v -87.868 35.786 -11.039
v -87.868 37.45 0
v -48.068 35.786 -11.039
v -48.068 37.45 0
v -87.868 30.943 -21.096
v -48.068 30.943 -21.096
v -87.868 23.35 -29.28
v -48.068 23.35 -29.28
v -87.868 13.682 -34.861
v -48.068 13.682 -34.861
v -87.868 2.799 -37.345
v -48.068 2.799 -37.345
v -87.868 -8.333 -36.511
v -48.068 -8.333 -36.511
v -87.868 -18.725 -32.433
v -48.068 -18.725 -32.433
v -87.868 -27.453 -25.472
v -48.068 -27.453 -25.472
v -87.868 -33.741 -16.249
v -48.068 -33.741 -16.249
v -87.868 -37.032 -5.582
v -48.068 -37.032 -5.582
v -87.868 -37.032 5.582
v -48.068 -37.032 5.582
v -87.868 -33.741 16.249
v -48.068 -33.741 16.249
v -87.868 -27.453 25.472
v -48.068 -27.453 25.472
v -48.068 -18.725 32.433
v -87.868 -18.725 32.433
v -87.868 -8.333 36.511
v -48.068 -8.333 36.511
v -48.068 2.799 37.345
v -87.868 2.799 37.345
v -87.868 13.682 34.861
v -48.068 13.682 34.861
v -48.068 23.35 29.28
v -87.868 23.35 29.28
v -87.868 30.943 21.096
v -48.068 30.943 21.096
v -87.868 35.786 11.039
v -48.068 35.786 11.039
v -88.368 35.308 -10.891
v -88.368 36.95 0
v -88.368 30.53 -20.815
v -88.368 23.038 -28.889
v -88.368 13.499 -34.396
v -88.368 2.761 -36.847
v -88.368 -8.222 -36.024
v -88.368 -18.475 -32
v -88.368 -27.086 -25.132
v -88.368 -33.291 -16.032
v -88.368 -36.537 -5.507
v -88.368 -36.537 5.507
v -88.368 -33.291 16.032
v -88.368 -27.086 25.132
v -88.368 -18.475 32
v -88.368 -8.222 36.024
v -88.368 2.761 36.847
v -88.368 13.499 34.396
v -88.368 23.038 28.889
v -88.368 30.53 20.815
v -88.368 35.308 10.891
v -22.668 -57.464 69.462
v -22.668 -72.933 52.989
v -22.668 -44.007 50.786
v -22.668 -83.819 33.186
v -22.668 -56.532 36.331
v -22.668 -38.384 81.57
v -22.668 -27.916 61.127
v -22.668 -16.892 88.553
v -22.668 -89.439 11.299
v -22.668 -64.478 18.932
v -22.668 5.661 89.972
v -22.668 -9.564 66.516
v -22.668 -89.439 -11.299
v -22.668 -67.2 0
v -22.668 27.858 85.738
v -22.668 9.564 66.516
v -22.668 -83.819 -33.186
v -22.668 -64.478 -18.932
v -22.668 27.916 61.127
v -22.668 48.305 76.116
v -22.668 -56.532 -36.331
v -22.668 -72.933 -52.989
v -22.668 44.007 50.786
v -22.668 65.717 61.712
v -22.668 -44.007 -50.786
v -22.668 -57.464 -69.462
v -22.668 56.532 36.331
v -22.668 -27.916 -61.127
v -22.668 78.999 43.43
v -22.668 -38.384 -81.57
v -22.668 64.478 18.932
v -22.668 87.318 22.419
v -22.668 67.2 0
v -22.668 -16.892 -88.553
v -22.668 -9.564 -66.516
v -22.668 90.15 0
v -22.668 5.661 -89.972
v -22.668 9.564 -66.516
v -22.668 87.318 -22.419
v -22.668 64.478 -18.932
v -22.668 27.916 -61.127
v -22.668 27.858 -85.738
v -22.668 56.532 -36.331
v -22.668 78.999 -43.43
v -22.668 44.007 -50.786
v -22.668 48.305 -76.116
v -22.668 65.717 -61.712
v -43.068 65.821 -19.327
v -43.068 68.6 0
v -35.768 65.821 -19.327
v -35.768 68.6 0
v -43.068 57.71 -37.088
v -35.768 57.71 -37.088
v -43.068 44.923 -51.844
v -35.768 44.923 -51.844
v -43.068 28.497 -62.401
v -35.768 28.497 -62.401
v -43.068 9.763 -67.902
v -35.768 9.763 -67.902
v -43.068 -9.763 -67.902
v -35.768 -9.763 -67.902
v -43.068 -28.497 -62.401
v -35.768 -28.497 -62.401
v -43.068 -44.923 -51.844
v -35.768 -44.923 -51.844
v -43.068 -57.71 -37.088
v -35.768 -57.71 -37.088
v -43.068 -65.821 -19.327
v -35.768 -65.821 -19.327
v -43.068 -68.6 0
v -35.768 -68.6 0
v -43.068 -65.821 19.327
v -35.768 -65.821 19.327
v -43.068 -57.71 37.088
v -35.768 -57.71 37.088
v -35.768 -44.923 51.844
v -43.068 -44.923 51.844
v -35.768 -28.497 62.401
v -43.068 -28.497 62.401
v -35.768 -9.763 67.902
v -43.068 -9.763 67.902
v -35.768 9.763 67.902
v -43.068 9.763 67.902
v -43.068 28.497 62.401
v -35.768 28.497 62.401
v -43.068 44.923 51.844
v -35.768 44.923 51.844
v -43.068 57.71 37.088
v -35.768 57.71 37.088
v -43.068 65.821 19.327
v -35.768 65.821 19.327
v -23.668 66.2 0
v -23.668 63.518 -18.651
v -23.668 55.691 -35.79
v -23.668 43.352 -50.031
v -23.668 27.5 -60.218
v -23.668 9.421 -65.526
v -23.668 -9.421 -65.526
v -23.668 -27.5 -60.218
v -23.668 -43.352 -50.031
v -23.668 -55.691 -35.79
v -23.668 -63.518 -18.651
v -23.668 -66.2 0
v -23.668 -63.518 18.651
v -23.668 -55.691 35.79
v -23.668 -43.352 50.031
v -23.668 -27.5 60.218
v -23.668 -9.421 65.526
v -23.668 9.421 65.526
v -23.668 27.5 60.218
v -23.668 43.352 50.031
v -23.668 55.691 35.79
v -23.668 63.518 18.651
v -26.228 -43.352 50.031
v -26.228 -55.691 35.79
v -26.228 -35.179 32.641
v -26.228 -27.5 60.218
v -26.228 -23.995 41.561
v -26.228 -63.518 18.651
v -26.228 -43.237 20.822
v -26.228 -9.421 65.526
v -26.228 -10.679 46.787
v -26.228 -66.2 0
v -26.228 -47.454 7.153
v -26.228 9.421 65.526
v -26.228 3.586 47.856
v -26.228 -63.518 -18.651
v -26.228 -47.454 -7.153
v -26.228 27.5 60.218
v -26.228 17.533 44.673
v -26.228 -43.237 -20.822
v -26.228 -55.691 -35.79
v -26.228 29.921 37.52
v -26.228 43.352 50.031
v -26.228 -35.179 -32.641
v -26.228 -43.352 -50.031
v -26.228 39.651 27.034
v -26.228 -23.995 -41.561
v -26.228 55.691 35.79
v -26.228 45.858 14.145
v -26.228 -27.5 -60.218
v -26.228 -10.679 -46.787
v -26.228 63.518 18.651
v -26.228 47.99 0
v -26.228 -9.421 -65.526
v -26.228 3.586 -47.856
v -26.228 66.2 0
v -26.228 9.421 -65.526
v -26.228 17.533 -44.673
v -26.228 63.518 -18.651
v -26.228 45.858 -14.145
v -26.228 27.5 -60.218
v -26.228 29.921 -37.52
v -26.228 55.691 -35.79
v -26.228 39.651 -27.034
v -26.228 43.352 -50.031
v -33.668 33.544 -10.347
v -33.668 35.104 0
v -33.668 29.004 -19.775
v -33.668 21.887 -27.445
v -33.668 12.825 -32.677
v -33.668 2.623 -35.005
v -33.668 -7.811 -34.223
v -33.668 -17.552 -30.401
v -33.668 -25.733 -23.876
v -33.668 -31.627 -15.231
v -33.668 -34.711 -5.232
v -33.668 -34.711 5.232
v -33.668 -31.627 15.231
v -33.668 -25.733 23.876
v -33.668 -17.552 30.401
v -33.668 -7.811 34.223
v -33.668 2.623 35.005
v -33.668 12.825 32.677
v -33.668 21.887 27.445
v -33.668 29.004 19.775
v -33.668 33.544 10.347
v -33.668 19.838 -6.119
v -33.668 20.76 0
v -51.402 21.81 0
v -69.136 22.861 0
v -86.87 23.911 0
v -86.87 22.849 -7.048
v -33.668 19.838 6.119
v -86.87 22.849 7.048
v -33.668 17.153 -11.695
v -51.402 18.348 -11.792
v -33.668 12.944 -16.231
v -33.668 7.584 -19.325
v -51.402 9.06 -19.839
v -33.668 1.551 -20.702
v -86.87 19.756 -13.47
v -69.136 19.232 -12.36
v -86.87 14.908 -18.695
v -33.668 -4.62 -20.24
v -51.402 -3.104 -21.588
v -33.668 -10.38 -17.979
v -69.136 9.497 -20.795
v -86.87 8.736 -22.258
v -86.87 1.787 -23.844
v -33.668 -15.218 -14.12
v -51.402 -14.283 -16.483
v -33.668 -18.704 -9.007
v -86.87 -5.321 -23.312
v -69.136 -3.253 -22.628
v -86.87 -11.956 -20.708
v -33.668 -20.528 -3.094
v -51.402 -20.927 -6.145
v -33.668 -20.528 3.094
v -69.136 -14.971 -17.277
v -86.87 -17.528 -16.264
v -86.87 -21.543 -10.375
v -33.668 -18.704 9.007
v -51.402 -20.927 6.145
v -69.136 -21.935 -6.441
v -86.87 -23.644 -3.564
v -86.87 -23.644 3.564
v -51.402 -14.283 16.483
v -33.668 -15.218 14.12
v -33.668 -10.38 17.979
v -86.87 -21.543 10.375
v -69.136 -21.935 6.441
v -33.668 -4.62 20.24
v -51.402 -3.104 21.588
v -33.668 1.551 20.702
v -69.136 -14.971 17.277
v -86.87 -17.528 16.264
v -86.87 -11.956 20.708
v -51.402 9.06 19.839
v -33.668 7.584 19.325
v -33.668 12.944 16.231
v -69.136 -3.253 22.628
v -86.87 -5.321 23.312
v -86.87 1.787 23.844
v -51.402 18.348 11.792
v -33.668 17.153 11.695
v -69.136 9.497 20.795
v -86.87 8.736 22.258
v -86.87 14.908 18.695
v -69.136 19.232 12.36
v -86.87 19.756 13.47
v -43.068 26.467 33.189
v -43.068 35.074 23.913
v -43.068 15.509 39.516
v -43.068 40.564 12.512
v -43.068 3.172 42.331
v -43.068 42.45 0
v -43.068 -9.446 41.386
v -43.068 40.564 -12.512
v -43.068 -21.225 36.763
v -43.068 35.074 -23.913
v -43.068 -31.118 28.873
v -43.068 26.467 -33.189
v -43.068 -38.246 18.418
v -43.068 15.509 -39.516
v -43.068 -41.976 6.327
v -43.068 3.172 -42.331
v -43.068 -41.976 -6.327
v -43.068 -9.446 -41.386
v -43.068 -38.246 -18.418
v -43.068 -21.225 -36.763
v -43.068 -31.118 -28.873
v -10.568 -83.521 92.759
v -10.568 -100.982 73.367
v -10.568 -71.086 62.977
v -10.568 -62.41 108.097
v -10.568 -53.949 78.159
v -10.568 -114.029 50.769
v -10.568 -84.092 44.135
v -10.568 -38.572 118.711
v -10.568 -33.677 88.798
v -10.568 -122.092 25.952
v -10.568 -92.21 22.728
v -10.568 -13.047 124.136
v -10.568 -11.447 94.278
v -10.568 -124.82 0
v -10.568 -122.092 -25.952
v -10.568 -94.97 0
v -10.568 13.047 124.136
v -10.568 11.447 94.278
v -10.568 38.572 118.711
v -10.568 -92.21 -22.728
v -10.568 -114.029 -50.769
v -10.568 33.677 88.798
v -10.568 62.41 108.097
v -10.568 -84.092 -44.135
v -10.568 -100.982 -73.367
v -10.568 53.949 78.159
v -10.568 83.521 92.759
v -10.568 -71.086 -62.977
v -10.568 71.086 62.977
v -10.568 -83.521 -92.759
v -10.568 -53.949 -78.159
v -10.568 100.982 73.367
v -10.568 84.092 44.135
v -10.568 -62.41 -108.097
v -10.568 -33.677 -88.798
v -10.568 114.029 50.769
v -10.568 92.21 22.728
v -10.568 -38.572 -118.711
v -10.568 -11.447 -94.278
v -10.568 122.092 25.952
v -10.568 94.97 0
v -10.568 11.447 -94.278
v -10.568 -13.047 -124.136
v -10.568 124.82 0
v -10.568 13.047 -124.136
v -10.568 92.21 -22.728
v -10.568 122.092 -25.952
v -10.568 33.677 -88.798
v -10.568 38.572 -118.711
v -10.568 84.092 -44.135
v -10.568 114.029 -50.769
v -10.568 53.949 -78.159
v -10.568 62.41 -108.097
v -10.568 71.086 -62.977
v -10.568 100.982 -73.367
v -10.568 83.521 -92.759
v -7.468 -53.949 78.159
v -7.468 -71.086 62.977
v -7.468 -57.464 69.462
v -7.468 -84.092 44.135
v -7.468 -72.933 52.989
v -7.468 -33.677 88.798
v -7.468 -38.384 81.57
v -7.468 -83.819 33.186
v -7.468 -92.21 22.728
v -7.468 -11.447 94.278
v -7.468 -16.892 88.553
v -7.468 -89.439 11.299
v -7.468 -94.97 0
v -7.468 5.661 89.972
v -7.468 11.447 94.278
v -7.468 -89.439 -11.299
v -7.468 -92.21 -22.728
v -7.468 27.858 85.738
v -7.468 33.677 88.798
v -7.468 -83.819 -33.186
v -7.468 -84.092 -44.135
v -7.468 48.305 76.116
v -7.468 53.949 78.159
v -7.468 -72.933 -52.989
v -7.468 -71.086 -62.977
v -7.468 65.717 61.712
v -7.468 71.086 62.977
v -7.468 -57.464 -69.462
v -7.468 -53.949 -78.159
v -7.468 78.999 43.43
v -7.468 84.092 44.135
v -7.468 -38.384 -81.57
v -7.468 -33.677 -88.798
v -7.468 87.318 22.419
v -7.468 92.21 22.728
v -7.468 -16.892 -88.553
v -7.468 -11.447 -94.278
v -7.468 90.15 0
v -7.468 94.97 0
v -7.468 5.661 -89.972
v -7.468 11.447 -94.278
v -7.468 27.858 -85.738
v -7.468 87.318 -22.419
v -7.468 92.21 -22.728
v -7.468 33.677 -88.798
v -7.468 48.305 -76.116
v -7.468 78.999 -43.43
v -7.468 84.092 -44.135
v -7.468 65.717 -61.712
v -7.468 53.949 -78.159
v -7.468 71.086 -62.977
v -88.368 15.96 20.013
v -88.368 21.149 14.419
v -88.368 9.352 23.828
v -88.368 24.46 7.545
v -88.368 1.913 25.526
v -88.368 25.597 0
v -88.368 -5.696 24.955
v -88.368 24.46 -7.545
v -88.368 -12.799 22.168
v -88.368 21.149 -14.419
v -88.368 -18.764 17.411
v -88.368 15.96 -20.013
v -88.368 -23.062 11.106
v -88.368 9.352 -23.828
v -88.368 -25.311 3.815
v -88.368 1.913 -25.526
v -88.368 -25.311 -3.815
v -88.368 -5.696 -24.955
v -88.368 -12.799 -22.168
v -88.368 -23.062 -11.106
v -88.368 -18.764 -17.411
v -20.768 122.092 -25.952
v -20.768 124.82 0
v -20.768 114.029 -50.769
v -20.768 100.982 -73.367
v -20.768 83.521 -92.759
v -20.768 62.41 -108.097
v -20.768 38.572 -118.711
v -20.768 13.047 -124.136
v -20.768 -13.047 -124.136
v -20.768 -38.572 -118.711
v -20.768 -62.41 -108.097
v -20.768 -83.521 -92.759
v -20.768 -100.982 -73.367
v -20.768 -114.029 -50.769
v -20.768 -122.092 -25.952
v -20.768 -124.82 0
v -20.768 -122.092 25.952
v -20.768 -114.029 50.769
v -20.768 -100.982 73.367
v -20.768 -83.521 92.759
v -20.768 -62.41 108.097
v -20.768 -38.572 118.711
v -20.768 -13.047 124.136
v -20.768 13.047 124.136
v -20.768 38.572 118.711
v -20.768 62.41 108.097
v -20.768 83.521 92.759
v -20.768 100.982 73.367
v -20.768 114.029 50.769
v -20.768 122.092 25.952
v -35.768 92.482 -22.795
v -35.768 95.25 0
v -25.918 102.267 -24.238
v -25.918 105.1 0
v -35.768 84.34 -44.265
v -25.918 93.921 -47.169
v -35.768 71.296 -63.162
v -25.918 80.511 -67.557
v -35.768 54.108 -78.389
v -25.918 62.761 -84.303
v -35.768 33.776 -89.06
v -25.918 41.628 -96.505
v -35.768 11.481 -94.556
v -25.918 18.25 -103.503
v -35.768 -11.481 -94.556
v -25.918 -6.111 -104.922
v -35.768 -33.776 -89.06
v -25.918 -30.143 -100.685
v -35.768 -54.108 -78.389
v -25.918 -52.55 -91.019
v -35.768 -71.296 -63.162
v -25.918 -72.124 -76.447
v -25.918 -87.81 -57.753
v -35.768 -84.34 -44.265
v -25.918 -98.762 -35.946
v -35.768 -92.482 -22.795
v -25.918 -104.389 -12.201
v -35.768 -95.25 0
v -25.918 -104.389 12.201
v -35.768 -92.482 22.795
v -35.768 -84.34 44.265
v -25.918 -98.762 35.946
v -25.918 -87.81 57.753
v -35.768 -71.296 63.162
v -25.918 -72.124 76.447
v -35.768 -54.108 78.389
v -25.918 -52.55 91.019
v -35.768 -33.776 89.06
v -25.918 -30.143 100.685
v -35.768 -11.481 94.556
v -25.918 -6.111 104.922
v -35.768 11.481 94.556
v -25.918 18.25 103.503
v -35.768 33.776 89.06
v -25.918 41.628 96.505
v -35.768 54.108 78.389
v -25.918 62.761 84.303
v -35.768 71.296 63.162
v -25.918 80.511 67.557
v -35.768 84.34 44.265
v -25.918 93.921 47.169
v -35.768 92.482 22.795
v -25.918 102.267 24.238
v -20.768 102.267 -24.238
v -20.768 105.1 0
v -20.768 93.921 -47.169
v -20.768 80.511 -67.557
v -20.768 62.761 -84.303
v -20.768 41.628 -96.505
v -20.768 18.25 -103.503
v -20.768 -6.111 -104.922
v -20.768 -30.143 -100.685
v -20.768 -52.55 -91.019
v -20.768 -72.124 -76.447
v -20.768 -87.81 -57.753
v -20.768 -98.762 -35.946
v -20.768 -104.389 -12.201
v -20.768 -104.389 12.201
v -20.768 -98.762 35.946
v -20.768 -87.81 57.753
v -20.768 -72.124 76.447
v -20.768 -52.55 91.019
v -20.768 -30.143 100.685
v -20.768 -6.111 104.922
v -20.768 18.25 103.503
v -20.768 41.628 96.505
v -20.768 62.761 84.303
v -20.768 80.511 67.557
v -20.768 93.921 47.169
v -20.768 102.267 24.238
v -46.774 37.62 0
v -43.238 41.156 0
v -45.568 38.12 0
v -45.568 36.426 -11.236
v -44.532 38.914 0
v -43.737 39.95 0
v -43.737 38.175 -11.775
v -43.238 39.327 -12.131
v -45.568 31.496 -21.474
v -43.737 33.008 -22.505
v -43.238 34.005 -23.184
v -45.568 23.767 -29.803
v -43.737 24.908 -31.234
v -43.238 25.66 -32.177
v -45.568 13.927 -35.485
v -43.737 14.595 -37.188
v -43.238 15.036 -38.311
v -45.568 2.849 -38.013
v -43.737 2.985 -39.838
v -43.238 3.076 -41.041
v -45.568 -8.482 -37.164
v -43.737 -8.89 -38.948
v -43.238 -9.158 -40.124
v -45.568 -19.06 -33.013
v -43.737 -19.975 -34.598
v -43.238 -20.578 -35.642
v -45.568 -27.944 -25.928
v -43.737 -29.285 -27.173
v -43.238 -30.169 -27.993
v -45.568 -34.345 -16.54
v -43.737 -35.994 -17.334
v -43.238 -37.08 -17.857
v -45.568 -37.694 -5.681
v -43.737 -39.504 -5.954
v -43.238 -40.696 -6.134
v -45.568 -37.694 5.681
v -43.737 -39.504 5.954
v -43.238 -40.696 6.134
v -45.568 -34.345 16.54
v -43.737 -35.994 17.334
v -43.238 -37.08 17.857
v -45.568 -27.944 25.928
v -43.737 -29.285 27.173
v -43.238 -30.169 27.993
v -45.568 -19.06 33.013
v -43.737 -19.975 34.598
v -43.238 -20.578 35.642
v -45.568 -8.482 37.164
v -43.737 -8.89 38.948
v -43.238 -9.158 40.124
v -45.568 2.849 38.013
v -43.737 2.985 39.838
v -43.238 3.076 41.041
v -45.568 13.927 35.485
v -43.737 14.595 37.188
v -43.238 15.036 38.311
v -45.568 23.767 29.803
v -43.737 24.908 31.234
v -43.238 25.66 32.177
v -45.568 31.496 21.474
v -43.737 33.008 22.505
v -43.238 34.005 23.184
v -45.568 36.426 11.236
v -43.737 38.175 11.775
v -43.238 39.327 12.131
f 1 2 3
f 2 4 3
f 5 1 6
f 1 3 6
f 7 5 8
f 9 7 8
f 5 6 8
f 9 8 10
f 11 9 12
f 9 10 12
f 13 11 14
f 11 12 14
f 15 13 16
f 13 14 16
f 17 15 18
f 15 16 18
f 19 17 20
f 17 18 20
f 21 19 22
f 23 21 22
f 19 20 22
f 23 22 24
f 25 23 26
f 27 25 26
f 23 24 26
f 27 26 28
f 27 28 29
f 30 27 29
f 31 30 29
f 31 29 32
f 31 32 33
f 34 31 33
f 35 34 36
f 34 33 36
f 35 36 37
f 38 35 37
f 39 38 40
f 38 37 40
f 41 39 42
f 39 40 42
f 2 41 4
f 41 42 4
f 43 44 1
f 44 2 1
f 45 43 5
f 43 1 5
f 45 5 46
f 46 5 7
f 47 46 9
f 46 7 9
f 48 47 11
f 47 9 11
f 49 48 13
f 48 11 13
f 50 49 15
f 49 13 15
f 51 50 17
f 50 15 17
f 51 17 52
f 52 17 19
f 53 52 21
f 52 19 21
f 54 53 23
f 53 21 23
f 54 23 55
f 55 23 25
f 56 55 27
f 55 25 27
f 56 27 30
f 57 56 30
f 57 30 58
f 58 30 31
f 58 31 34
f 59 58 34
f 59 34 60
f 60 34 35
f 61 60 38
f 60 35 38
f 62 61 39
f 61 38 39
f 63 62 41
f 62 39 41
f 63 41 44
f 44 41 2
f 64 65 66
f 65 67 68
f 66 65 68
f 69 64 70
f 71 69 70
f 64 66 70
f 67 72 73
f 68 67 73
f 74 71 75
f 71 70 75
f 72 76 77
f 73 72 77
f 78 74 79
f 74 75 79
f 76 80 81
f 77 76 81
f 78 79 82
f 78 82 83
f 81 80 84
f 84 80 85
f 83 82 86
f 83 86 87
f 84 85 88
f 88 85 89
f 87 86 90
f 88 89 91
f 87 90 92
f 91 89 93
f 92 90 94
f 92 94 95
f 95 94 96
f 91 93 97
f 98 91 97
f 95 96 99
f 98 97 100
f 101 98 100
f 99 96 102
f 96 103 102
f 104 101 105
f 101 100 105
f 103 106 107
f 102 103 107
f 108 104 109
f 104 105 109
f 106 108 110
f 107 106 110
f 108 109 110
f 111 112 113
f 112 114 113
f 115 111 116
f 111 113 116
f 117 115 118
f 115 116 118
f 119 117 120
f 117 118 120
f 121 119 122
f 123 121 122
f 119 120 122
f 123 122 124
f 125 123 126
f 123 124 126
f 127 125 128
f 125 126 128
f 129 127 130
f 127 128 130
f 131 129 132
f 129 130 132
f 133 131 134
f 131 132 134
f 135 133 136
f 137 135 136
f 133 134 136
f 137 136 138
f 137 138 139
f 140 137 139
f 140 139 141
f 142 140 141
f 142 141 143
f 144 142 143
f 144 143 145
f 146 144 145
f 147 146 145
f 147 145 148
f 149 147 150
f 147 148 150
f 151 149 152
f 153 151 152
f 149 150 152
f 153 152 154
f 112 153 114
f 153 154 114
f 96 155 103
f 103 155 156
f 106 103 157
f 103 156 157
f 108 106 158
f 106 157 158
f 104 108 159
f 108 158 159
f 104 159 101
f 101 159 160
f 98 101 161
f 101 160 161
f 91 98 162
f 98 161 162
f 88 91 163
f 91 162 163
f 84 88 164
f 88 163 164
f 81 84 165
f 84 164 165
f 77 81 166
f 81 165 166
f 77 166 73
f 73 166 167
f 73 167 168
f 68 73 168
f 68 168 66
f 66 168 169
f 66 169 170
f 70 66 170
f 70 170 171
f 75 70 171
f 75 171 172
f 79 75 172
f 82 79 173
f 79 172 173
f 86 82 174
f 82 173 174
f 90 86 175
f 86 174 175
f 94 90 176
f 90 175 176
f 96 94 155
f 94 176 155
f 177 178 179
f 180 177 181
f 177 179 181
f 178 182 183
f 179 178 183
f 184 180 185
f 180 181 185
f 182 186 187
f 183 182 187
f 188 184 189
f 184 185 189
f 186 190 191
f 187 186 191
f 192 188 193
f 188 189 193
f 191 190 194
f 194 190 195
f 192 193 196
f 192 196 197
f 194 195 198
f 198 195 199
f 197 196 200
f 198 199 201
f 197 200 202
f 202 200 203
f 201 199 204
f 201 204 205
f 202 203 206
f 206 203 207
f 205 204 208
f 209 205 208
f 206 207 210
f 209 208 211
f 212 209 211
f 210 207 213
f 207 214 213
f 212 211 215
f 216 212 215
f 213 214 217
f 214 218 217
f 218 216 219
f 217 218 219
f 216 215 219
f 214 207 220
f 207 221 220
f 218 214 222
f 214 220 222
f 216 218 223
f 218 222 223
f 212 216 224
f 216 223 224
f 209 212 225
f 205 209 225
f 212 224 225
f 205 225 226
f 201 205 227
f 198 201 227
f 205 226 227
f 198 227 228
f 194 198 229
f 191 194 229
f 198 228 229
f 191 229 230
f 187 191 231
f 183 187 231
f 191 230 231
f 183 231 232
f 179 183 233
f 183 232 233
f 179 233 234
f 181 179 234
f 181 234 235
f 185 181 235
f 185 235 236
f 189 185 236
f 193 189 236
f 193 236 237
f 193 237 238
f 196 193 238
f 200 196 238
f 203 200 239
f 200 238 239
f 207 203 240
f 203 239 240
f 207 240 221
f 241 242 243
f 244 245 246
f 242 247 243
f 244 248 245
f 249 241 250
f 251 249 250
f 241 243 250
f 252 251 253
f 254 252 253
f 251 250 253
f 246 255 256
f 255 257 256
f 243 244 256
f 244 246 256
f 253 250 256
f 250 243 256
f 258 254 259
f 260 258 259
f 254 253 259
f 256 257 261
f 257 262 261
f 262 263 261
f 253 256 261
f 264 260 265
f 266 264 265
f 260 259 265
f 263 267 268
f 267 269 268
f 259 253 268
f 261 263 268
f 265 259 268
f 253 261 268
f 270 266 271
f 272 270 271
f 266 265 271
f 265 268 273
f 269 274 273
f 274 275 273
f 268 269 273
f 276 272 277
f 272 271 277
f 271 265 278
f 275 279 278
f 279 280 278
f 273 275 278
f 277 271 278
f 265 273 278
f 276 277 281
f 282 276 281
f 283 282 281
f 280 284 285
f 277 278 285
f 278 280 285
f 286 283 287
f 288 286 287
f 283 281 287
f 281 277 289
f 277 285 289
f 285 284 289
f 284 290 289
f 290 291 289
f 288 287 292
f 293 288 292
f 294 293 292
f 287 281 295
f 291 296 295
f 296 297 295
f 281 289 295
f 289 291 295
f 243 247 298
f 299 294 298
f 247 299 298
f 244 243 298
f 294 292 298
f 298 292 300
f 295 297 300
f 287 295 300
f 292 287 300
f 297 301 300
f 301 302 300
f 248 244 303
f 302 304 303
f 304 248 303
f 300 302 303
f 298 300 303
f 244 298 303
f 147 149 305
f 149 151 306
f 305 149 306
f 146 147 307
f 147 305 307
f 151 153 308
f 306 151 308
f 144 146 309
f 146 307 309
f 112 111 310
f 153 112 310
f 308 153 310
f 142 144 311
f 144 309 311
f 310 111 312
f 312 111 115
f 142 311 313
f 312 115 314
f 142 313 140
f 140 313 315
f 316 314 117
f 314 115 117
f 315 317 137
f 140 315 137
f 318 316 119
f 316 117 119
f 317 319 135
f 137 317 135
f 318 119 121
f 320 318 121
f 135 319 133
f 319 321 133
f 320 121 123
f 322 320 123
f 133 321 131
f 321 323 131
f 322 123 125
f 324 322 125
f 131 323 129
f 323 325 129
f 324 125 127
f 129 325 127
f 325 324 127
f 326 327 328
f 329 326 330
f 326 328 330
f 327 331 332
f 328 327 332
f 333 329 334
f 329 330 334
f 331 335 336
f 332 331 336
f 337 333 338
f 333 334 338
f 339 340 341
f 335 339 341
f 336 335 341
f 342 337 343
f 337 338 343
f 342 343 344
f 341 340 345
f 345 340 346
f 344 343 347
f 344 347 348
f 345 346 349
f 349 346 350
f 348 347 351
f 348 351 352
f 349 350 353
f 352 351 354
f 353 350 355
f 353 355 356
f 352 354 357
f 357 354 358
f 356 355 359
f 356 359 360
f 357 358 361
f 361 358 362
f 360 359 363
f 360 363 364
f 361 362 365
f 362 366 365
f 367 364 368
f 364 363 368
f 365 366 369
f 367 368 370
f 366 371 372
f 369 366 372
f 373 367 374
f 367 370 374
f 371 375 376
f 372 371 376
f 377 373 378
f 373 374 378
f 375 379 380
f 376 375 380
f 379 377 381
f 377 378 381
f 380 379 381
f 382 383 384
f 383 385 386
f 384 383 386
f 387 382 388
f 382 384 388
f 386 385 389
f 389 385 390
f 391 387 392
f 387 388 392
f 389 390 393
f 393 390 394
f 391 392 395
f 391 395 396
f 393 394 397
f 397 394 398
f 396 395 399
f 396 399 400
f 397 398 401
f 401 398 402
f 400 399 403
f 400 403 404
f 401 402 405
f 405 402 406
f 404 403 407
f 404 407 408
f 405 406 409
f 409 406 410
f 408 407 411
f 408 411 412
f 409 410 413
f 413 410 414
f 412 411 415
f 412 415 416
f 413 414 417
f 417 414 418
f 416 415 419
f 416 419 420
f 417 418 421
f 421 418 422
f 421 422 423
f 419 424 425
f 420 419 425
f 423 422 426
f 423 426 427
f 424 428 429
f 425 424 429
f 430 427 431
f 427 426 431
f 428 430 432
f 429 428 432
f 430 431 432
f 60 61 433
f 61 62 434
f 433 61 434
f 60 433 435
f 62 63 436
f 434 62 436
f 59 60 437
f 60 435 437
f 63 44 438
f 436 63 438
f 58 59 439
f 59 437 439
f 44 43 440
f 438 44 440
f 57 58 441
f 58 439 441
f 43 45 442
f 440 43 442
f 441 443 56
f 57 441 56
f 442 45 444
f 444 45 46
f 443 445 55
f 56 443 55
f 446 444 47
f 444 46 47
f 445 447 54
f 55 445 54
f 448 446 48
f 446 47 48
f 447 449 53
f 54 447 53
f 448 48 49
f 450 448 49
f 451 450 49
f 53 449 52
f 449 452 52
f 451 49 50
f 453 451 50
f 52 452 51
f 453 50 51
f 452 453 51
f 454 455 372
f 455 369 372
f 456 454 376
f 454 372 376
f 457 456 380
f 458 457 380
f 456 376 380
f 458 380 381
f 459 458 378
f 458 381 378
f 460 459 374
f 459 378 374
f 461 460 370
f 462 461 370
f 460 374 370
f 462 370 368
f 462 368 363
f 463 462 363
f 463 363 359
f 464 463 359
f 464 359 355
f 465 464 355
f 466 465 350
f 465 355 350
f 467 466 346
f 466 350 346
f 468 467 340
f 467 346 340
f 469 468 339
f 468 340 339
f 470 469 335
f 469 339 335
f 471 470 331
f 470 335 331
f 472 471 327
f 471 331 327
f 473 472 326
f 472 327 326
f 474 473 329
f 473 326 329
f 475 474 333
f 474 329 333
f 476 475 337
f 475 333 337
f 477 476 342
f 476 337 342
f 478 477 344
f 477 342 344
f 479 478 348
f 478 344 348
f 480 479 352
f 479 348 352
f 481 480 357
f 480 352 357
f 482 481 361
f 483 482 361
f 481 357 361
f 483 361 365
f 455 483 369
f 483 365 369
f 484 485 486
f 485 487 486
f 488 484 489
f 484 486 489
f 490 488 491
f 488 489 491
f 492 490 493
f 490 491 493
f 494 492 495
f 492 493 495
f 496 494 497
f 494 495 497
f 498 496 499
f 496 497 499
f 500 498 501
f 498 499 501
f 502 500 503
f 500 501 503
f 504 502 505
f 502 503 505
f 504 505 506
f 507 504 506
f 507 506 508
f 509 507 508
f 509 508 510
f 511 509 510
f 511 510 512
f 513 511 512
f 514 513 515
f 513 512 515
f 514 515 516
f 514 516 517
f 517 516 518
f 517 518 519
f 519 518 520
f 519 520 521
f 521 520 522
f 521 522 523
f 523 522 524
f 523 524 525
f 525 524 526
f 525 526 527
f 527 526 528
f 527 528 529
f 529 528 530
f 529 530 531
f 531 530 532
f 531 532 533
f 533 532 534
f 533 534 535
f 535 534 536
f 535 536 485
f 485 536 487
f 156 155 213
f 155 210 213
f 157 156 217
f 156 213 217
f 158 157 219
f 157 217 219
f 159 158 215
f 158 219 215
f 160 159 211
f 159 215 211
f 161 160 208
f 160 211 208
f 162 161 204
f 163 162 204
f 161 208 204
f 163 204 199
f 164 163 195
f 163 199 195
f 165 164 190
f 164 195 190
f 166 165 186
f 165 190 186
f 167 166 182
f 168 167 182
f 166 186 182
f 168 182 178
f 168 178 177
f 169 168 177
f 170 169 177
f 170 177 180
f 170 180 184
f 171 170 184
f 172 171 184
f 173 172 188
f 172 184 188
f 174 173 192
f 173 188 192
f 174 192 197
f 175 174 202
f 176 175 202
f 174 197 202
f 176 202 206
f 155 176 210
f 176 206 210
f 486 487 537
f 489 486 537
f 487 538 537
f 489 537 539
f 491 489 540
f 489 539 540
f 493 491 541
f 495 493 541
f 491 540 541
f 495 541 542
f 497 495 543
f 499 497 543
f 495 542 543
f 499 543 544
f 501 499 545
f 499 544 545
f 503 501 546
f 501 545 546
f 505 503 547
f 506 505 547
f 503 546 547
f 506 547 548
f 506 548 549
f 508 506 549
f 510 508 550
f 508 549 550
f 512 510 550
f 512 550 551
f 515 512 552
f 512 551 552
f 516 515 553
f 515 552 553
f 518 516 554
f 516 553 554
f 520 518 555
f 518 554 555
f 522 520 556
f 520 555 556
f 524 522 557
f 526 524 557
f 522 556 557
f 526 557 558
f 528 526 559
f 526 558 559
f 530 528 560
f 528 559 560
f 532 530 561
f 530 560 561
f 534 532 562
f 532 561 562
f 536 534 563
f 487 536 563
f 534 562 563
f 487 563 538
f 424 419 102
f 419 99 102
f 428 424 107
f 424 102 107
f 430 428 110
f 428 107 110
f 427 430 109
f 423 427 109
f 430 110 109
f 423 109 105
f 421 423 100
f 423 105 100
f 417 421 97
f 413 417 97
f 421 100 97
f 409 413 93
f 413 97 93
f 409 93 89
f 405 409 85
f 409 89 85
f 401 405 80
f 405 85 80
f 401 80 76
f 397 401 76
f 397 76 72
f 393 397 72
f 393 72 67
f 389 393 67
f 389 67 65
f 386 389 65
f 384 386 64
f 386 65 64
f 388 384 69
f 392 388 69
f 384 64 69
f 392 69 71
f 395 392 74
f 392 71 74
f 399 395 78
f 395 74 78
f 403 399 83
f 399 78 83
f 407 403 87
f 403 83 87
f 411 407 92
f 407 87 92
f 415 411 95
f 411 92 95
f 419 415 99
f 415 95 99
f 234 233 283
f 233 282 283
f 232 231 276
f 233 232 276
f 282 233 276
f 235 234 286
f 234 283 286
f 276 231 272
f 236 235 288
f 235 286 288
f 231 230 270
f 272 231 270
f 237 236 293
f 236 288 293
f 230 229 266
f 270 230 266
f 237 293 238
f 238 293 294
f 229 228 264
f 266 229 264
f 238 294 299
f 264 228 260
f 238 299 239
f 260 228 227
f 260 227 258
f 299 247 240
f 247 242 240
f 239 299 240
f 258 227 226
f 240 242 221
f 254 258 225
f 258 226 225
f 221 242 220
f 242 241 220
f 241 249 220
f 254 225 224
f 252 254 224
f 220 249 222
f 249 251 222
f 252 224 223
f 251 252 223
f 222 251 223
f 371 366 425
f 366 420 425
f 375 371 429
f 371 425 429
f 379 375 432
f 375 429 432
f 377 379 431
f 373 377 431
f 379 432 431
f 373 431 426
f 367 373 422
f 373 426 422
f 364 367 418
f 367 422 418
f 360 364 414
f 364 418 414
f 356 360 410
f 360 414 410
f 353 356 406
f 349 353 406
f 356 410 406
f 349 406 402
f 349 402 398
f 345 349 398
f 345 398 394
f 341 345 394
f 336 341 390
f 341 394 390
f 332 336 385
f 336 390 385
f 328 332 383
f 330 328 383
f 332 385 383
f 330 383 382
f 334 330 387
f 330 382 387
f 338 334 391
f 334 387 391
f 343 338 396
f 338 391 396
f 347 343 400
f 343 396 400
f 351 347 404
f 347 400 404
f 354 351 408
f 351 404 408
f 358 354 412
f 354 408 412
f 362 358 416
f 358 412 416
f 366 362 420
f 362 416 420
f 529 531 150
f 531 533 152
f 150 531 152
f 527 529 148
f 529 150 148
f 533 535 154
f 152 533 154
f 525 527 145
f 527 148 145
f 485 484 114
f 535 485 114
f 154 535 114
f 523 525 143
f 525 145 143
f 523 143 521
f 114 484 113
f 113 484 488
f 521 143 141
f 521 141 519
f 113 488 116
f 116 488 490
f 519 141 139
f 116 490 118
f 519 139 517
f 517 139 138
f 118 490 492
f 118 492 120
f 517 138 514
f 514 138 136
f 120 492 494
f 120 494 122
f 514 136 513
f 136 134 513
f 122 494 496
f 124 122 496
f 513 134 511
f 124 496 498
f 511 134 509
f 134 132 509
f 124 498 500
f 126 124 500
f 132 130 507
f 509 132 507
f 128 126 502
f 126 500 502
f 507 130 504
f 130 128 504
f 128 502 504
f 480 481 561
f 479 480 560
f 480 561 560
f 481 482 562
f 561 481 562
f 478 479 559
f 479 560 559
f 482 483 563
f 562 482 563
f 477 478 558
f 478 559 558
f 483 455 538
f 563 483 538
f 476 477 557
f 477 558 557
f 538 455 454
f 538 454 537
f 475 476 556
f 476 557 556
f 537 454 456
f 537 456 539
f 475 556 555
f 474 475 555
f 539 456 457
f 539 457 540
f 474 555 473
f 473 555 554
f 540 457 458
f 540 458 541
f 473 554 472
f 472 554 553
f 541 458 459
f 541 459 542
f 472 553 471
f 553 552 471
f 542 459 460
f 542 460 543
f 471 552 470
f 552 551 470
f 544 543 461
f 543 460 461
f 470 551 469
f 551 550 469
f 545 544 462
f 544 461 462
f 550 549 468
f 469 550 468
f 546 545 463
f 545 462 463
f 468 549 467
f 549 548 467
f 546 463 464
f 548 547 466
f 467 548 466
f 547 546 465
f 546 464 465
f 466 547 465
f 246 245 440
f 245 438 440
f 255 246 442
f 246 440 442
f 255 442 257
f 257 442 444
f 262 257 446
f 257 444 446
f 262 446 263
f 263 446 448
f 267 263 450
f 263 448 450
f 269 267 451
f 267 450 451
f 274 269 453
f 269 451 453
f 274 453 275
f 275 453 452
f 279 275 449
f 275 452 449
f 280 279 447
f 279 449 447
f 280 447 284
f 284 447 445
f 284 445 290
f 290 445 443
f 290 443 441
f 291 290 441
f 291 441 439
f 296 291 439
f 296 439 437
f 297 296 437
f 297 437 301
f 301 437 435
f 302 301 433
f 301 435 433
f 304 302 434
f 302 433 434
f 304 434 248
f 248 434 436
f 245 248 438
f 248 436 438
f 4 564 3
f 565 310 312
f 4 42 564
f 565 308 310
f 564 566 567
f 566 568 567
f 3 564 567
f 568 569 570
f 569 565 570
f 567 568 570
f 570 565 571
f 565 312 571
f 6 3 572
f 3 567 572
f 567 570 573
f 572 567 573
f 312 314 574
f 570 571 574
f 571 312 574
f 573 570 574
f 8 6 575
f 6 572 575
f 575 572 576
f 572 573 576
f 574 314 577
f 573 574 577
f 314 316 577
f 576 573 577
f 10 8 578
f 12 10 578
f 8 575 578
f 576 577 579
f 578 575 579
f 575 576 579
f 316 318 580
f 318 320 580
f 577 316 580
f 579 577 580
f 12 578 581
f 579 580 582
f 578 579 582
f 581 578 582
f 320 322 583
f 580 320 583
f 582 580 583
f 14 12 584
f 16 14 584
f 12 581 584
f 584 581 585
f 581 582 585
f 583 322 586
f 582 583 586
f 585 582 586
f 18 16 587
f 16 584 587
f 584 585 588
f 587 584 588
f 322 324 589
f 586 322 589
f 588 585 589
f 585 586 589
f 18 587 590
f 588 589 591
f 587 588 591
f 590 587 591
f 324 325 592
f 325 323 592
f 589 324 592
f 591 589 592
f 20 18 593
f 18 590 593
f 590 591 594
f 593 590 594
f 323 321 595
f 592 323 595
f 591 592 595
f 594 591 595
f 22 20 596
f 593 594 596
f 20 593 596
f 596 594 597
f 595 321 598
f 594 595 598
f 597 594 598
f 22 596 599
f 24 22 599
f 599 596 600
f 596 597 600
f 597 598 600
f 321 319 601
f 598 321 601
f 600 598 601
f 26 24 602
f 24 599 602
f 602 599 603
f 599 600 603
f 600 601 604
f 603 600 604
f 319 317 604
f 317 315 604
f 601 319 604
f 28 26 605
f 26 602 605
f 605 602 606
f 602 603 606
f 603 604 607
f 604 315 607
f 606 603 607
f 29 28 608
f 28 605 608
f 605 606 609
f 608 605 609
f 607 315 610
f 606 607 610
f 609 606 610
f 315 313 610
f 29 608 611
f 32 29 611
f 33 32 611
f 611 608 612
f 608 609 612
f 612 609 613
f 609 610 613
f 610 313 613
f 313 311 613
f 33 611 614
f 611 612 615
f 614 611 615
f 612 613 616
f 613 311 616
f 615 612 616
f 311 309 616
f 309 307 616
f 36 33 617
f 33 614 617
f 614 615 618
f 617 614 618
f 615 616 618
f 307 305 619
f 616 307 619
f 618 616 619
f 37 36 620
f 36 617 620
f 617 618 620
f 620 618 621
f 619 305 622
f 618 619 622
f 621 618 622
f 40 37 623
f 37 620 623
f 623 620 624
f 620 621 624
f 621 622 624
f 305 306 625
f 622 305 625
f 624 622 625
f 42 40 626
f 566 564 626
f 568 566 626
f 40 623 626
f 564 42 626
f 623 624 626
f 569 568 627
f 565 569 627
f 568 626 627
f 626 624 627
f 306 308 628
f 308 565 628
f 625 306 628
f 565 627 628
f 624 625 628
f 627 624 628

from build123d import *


with BuildPart() as part:
    # Эскиз1 → Повернуть1 (revolve)
    with BuildSketch(Plane.XY):
        with BuildLine():
            Line((-88.367595483, 25.597236847), (-88.367595483, 36.95))
            Line((-88.367595483, 36.95), (-87.867595483, 37.45))
            Line((-87.867595483, 37.45), (-48.067595483, 37.45))
            ThreePointArc((-48.067595483, 37.45), (-44.532061577, 38.914466094), (-43.067595483, 42.45))
            Line((-43.067595483, 42.45), (-43.067595483, 68.6))
            Line((-43.067595483, 68.6), (-35.767595483, 68.6))
            Line((-35.767595483, 68.6), (-35.767595483, 95.25))
            Line((-35.767595483, 95.25), (-25.917595483, 105.1))
            Line((-25.917595483, 105.1), (-20.767595483, 105.1))
            Line((-20.767595483, 105.1), (-20.767595483, 124.82))
            Line((-20.767595483, 124.82), (-10.567595483, 124.82))
            Line((-10.567595483, 124.82), (-10.567595483, 94.97))
            Line((-10.567595483, 94.97), (-7.467595483, 94.97))
            Line((-7.467595483, 94.97), (-7.467595483, 90.15))
            Line((-7.467595483, 90.15), (-22.667595483, 90.15))
            Line((-22.667595483, 90.15), (-22.667595483, 67.2))
            Line((-22.667595483, 67.2), (-23.667595483, 66.2))
            Line((-23.667595483, 66.2), (-26.227595483, 66.2))
            Line((-26.227595483, 66.2), (-26.227595483, 47.99))
            Line((-26.227595483, 47.99), (-33.667595483, 35.103541992))
            Line((-33.667595483, 35.103541992), (-33.667595483, 20.76))
            Line((-33.667595483, 20.76), (-86.870219917, 23.911307188))
            Line((-86.870219917, 23.911307188), (-88.367595483, 25.597236847))
        make_face()
    revolve(axis=Axis((0, 0, 0), (-1, 0, 0)))


solid = part.part
